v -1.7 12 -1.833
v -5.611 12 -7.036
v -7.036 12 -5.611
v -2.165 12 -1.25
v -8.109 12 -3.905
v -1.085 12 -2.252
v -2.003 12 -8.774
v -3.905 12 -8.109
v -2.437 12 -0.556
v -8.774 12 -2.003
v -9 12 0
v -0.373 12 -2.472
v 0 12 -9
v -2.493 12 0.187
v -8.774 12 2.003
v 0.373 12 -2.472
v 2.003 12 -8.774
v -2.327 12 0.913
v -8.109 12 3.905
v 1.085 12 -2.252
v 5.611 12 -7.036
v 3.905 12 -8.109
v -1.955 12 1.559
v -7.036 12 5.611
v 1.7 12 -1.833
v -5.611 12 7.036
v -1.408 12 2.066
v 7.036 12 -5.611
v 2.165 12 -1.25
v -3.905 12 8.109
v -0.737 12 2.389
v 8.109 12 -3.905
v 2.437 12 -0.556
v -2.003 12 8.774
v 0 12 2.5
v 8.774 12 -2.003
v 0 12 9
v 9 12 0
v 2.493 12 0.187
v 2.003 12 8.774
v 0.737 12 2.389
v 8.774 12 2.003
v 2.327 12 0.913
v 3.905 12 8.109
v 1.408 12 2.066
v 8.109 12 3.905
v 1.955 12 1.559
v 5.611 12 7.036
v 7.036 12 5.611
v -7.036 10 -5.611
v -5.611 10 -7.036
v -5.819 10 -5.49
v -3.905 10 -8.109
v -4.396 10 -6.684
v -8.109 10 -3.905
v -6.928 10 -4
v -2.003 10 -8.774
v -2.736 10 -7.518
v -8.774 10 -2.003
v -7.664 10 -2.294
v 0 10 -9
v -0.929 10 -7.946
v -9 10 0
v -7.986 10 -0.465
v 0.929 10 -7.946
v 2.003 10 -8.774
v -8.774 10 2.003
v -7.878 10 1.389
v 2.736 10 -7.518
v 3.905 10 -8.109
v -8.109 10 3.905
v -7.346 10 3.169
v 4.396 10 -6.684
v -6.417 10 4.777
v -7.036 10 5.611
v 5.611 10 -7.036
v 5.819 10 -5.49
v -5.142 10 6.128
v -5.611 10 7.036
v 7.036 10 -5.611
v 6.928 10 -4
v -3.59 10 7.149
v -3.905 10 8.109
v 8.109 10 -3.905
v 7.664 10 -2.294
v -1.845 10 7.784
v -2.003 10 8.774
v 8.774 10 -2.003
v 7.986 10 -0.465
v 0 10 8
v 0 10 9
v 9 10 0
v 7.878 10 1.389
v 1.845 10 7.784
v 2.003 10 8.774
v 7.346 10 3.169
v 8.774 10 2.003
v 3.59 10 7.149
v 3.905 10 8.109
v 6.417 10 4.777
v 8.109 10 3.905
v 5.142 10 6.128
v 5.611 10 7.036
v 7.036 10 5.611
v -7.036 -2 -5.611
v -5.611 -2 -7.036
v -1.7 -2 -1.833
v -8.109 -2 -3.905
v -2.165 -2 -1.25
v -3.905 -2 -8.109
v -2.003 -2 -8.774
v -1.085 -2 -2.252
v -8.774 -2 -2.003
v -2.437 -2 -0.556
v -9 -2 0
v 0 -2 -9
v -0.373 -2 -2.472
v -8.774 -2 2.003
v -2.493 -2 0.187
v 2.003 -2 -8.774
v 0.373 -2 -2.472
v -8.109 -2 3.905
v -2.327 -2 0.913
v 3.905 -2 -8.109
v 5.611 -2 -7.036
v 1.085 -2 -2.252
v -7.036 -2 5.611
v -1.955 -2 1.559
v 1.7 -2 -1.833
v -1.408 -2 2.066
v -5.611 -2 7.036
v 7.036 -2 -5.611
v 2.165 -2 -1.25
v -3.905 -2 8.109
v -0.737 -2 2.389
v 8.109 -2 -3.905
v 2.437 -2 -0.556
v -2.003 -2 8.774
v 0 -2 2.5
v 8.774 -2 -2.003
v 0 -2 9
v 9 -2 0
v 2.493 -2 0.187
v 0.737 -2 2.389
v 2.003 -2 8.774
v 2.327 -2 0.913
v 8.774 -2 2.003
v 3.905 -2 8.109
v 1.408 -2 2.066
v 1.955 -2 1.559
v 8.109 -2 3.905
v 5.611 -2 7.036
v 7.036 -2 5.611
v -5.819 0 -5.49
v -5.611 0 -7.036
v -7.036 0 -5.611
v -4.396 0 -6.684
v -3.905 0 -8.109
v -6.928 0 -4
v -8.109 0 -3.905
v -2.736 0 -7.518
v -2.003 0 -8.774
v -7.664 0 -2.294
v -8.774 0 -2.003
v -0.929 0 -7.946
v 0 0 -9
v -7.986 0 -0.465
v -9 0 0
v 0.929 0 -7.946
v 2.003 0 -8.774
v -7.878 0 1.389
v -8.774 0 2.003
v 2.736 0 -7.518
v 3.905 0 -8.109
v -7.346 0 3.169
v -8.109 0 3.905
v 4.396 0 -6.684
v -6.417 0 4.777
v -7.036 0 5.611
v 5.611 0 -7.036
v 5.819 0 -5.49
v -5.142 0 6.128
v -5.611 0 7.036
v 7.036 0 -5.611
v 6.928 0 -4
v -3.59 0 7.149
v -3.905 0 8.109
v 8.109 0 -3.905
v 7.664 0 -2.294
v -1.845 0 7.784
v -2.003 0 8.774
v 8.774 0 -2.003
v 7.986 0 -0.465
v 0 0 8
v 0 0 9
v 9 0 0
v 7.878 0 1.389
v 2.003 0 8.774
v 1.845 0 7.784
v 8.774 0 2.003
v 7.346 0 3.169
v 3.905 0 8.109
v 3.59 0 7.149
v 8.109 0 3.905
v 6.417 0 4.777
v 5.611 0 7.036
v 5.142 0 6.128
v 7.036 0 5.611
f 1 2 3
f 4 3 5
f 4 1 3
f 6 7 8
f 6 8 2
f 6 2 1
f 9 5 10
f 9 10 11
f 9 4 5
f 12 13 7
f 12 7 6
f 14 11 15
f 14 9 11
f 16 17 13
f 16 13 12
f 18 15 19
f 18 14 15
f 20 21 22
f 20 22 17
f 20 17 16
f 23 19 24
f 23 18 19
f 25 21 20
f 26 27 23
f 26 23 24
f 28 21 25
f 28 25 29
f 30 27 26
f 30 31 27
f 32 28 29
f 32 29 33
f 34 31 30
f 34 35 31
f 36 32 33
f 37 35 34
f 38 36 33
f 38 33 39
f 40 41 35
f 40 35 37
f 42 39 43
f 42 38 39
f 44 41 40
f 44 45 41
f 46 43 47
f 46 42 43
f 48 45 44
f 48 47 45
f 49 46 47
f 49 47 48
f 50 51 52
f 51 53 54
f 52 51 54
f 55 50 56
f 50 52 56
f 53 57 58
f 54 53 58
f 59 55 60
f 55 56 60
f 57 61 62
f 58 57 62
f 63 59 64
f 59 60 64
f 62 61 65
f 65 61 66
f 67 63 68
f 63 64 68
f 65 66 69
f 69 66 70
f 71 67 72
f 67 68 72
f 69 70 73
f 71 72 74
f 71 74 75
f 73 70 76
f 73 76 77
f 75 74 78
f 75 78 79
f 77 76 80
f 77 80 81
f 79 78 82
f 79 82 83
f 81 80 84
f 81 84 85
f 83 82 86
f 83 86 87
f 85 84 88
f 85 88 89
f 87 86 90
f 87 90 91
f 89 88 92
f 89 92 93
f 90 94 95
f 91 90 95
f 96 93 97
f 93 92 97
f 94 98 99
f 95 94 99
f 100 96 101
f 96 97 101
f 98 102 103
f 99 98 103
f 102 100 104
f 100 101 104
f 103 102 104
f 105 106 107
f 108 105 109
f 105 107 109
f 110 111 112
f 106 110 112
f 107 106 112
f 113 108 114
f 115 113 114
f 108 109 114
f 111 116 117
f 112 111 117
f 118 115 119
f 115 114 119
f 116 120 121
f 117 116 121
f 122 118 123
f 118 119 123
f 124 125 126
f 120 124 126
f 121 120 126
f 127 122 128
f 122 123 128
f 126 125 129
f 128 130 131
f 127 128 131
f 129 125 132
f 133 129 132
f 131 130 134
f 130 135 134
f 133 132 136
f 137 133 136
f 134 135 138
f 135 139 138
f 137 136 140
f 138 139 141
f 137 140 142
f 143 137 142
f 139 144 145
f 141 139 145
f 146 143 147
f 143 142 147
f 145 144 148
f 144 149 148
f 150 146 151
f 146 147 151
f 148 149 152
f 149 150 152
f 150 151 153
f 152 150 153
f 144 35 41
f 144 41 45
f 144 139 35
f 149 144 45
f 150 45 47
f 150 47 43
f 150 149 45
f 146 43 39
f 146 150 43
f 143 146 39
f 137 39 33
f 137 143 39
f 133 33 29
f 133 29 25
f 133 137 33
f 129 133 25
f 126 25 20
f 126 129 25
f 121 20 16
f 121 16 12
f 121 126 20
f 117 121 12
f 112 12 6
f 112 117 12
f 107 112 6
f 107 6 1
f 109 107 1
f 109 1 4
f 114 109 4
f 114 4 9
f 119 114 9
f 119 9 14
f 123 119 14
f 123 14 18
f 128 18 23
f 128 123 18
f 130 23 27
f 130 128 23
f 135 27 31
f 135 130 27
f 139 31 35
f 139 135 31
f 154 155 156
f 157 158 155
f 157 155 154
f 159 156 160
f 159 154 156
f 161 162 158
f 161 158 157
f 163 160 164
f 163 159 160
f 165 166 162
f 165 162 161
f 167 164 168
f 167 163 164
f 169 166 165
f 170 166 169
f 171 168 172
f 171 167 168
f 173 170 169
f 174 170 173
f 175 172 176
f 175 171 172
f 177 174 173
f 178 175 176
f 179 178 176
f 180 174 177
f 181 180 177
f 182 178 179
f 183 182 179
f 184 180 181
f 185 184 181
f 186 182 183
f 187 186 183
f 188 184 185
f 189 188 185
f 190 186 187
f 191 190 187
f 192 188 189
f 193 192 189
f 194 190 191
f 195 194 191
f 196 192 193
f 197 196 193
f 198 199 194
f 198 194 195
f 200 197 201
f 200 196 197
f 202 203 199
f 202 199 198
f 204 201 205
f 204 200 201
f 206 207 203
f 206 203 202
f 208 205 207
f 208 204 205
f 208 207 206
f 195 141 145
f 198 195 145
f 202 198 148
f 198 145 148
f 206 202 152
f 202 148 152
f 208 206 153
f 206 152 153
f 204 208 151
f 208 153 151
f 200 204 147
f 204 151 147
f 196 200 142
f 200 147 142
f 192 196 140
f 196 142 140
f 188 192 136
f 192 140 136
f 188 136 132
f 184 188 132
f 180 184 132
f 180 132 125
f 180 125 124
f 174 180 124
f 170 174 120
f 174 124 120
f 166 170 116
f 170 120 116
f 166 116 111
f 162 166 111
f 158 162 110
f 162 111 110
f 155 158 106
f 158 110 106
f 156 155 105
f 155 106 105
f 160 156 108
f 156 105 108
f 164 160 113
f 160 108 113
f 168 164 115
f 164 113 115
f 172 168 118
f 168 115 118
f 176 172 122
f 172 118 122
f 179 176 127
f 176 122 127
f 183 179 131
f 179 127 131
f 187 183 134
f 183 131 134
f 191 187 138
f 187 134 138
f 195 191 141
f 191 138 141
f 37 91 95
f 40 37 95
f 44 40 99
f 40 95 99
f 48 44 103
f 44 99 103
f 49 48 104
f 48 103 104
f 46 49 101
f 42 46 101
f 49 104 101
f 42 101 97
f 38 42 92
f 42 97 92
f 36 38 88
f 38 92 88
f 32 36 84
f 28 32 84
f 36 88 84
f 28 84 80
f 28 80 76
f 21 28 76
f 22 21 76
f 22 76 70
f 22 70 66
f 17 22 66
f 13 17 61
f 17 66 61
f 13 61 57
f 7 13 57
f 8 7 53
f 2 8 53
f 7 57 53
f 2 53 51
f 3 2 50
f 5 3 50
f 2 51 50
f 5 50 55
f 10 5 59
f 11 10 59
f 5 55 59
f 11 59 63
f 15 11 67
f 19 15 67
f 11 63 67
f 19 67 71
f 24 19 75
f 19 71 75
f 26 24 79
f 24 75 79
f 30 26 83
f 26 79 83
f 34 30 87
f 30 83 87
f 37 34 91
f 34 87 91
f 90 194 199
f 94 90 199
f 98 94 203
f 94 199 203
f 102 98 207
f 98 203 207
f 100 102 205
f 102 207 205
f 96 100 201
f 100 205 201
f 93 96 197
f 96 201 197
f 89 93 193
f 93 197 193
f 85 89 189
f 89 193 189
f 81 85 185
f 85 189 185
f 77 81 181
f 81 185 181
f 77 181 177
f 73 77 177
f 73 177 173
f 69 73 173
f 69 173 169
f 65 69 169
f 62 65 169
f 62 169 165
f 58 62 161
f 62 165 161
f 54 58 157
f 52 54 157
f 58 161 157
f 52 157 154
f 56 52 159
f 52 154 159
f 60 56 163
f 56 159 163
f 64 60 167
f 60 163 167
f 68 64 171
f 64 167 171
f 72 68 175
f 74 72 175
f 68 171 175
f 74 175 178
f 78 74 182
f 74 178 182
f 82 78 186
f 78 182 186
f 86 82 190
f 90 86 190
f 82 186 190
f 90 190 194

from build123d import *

# Parameters (mm, degrees)
SKETCH_1_R      = 8
SKETCH_1_R_2    = 2.5
EXTRUDE_1_DEPTH = 10
EXTRUDE_START   = -2
SKETCH_1_3_R    = 9
SKETCH_1_3_R_2  = 8
SKETCH_1_3_R_3  = 2.5
EXTRUDE_2_DEPTH = 2
EXTRUDE_START_2 = 10
SKETCH_1_4_R    = 9
SKETCH_1_4_R_2  = 8
SKETCH_1_4_R_3  = 2.5
EXTRUDE_3_DEPTH = 2


with BuildPart() as part:
    # 草图1 → 凸台-拉伸1 (new body)
    with BuildSketch(Plane(origin=(0, 0, 0), x_dir=(1, 0, 0), z_dir=(0, 1, 0))):
        with Locations(Location((0, 0, 0), (0, 0, 270))):
            Circle(SKETCH_1_R)
        with Locations(Location((0, 0, 0), (0, 0, 270))):
            Circle(SKETCH_1_R_2, mode=Mode.SUBTRACT)
    extrude(amount=EXTRUDE_1_DEPTH)

    # 草图1<3> → 凸台-拉伸2 (add)
    # profile 1 of 2: a face of its own
    with BuildSketch(Plane(origin=(0, 0, 0), x_dir=(1, 0, 0), z_dir=(0, 1, 0)).offset(EXTRUDE_START)):
        with Locations(Location((0, 0, 0), (0, 0, 270))):
            Circle(SKETCH_1_3_R)
        with Locations(Location((0, 0, 0), (0, 0, 270))):
            Circle(SKETCH_1_3_R_2, mode=Mode.SUBTRACT)
    # profile 2 of 2: a face of its own
    with BuildSketch(Plane(origin=(0, 0, 0), x_dir=(1, 0, 0), z_dir=(0, 1, 0)).offset(EXTRUDE_START)):
        with Locations(Location((0, 0, 0), (0, 0, 270))):
            Circle(SKETCH_1_3_R_2)
        with Locations(Location((0, 0, 0), (0, 0, 270))):
            Circle(SKETCH_1_3_R_3, mode=Mode.SUBTRACT)
    extrude(amount=EXTRUDE_2_DEPTH)

    # 草图1<4> → 凸台-拉伸3 (add)
    # profile 1 of 2: a face of its own
    with BuildSketch(Plane(origin=(0, 0, 0), x_dir=(1, 0, 0), z_dir=(0, 1, 0)).offset(EXTRUDE_START_2)):
        with Locations(Location((0, 0, 0), (0, 0, 270))):
            Circle(SKETCH_1_4_R)
        with Locations(Location((0, 0, 0), (0, 0, 270))):
            Circle(SKETCH_1_4_R_2, mode=Mode.SUBTRACT)
    # profile 2 of 2: a face of its own
    with BuildSketch(Plane(origin=(0, 0, 0), x_dir=(1, 0, 0), z_dir=(0, 1, 0)).offset(EXTRUDE_START_2)):
        with Locations(Location((0, 0, 0), (0, 0, 270))):
            Circle(SKETCH_1_4_R_2)
        with Locations(Location((0, 0, 0), (0, 0, 270))):
            Circle(SKETCH_1_4_R_3, mode=Mode.SUBTRACT)
    extrude(amount=EXTRUDE_3_DEPTH)


solid = part.part
